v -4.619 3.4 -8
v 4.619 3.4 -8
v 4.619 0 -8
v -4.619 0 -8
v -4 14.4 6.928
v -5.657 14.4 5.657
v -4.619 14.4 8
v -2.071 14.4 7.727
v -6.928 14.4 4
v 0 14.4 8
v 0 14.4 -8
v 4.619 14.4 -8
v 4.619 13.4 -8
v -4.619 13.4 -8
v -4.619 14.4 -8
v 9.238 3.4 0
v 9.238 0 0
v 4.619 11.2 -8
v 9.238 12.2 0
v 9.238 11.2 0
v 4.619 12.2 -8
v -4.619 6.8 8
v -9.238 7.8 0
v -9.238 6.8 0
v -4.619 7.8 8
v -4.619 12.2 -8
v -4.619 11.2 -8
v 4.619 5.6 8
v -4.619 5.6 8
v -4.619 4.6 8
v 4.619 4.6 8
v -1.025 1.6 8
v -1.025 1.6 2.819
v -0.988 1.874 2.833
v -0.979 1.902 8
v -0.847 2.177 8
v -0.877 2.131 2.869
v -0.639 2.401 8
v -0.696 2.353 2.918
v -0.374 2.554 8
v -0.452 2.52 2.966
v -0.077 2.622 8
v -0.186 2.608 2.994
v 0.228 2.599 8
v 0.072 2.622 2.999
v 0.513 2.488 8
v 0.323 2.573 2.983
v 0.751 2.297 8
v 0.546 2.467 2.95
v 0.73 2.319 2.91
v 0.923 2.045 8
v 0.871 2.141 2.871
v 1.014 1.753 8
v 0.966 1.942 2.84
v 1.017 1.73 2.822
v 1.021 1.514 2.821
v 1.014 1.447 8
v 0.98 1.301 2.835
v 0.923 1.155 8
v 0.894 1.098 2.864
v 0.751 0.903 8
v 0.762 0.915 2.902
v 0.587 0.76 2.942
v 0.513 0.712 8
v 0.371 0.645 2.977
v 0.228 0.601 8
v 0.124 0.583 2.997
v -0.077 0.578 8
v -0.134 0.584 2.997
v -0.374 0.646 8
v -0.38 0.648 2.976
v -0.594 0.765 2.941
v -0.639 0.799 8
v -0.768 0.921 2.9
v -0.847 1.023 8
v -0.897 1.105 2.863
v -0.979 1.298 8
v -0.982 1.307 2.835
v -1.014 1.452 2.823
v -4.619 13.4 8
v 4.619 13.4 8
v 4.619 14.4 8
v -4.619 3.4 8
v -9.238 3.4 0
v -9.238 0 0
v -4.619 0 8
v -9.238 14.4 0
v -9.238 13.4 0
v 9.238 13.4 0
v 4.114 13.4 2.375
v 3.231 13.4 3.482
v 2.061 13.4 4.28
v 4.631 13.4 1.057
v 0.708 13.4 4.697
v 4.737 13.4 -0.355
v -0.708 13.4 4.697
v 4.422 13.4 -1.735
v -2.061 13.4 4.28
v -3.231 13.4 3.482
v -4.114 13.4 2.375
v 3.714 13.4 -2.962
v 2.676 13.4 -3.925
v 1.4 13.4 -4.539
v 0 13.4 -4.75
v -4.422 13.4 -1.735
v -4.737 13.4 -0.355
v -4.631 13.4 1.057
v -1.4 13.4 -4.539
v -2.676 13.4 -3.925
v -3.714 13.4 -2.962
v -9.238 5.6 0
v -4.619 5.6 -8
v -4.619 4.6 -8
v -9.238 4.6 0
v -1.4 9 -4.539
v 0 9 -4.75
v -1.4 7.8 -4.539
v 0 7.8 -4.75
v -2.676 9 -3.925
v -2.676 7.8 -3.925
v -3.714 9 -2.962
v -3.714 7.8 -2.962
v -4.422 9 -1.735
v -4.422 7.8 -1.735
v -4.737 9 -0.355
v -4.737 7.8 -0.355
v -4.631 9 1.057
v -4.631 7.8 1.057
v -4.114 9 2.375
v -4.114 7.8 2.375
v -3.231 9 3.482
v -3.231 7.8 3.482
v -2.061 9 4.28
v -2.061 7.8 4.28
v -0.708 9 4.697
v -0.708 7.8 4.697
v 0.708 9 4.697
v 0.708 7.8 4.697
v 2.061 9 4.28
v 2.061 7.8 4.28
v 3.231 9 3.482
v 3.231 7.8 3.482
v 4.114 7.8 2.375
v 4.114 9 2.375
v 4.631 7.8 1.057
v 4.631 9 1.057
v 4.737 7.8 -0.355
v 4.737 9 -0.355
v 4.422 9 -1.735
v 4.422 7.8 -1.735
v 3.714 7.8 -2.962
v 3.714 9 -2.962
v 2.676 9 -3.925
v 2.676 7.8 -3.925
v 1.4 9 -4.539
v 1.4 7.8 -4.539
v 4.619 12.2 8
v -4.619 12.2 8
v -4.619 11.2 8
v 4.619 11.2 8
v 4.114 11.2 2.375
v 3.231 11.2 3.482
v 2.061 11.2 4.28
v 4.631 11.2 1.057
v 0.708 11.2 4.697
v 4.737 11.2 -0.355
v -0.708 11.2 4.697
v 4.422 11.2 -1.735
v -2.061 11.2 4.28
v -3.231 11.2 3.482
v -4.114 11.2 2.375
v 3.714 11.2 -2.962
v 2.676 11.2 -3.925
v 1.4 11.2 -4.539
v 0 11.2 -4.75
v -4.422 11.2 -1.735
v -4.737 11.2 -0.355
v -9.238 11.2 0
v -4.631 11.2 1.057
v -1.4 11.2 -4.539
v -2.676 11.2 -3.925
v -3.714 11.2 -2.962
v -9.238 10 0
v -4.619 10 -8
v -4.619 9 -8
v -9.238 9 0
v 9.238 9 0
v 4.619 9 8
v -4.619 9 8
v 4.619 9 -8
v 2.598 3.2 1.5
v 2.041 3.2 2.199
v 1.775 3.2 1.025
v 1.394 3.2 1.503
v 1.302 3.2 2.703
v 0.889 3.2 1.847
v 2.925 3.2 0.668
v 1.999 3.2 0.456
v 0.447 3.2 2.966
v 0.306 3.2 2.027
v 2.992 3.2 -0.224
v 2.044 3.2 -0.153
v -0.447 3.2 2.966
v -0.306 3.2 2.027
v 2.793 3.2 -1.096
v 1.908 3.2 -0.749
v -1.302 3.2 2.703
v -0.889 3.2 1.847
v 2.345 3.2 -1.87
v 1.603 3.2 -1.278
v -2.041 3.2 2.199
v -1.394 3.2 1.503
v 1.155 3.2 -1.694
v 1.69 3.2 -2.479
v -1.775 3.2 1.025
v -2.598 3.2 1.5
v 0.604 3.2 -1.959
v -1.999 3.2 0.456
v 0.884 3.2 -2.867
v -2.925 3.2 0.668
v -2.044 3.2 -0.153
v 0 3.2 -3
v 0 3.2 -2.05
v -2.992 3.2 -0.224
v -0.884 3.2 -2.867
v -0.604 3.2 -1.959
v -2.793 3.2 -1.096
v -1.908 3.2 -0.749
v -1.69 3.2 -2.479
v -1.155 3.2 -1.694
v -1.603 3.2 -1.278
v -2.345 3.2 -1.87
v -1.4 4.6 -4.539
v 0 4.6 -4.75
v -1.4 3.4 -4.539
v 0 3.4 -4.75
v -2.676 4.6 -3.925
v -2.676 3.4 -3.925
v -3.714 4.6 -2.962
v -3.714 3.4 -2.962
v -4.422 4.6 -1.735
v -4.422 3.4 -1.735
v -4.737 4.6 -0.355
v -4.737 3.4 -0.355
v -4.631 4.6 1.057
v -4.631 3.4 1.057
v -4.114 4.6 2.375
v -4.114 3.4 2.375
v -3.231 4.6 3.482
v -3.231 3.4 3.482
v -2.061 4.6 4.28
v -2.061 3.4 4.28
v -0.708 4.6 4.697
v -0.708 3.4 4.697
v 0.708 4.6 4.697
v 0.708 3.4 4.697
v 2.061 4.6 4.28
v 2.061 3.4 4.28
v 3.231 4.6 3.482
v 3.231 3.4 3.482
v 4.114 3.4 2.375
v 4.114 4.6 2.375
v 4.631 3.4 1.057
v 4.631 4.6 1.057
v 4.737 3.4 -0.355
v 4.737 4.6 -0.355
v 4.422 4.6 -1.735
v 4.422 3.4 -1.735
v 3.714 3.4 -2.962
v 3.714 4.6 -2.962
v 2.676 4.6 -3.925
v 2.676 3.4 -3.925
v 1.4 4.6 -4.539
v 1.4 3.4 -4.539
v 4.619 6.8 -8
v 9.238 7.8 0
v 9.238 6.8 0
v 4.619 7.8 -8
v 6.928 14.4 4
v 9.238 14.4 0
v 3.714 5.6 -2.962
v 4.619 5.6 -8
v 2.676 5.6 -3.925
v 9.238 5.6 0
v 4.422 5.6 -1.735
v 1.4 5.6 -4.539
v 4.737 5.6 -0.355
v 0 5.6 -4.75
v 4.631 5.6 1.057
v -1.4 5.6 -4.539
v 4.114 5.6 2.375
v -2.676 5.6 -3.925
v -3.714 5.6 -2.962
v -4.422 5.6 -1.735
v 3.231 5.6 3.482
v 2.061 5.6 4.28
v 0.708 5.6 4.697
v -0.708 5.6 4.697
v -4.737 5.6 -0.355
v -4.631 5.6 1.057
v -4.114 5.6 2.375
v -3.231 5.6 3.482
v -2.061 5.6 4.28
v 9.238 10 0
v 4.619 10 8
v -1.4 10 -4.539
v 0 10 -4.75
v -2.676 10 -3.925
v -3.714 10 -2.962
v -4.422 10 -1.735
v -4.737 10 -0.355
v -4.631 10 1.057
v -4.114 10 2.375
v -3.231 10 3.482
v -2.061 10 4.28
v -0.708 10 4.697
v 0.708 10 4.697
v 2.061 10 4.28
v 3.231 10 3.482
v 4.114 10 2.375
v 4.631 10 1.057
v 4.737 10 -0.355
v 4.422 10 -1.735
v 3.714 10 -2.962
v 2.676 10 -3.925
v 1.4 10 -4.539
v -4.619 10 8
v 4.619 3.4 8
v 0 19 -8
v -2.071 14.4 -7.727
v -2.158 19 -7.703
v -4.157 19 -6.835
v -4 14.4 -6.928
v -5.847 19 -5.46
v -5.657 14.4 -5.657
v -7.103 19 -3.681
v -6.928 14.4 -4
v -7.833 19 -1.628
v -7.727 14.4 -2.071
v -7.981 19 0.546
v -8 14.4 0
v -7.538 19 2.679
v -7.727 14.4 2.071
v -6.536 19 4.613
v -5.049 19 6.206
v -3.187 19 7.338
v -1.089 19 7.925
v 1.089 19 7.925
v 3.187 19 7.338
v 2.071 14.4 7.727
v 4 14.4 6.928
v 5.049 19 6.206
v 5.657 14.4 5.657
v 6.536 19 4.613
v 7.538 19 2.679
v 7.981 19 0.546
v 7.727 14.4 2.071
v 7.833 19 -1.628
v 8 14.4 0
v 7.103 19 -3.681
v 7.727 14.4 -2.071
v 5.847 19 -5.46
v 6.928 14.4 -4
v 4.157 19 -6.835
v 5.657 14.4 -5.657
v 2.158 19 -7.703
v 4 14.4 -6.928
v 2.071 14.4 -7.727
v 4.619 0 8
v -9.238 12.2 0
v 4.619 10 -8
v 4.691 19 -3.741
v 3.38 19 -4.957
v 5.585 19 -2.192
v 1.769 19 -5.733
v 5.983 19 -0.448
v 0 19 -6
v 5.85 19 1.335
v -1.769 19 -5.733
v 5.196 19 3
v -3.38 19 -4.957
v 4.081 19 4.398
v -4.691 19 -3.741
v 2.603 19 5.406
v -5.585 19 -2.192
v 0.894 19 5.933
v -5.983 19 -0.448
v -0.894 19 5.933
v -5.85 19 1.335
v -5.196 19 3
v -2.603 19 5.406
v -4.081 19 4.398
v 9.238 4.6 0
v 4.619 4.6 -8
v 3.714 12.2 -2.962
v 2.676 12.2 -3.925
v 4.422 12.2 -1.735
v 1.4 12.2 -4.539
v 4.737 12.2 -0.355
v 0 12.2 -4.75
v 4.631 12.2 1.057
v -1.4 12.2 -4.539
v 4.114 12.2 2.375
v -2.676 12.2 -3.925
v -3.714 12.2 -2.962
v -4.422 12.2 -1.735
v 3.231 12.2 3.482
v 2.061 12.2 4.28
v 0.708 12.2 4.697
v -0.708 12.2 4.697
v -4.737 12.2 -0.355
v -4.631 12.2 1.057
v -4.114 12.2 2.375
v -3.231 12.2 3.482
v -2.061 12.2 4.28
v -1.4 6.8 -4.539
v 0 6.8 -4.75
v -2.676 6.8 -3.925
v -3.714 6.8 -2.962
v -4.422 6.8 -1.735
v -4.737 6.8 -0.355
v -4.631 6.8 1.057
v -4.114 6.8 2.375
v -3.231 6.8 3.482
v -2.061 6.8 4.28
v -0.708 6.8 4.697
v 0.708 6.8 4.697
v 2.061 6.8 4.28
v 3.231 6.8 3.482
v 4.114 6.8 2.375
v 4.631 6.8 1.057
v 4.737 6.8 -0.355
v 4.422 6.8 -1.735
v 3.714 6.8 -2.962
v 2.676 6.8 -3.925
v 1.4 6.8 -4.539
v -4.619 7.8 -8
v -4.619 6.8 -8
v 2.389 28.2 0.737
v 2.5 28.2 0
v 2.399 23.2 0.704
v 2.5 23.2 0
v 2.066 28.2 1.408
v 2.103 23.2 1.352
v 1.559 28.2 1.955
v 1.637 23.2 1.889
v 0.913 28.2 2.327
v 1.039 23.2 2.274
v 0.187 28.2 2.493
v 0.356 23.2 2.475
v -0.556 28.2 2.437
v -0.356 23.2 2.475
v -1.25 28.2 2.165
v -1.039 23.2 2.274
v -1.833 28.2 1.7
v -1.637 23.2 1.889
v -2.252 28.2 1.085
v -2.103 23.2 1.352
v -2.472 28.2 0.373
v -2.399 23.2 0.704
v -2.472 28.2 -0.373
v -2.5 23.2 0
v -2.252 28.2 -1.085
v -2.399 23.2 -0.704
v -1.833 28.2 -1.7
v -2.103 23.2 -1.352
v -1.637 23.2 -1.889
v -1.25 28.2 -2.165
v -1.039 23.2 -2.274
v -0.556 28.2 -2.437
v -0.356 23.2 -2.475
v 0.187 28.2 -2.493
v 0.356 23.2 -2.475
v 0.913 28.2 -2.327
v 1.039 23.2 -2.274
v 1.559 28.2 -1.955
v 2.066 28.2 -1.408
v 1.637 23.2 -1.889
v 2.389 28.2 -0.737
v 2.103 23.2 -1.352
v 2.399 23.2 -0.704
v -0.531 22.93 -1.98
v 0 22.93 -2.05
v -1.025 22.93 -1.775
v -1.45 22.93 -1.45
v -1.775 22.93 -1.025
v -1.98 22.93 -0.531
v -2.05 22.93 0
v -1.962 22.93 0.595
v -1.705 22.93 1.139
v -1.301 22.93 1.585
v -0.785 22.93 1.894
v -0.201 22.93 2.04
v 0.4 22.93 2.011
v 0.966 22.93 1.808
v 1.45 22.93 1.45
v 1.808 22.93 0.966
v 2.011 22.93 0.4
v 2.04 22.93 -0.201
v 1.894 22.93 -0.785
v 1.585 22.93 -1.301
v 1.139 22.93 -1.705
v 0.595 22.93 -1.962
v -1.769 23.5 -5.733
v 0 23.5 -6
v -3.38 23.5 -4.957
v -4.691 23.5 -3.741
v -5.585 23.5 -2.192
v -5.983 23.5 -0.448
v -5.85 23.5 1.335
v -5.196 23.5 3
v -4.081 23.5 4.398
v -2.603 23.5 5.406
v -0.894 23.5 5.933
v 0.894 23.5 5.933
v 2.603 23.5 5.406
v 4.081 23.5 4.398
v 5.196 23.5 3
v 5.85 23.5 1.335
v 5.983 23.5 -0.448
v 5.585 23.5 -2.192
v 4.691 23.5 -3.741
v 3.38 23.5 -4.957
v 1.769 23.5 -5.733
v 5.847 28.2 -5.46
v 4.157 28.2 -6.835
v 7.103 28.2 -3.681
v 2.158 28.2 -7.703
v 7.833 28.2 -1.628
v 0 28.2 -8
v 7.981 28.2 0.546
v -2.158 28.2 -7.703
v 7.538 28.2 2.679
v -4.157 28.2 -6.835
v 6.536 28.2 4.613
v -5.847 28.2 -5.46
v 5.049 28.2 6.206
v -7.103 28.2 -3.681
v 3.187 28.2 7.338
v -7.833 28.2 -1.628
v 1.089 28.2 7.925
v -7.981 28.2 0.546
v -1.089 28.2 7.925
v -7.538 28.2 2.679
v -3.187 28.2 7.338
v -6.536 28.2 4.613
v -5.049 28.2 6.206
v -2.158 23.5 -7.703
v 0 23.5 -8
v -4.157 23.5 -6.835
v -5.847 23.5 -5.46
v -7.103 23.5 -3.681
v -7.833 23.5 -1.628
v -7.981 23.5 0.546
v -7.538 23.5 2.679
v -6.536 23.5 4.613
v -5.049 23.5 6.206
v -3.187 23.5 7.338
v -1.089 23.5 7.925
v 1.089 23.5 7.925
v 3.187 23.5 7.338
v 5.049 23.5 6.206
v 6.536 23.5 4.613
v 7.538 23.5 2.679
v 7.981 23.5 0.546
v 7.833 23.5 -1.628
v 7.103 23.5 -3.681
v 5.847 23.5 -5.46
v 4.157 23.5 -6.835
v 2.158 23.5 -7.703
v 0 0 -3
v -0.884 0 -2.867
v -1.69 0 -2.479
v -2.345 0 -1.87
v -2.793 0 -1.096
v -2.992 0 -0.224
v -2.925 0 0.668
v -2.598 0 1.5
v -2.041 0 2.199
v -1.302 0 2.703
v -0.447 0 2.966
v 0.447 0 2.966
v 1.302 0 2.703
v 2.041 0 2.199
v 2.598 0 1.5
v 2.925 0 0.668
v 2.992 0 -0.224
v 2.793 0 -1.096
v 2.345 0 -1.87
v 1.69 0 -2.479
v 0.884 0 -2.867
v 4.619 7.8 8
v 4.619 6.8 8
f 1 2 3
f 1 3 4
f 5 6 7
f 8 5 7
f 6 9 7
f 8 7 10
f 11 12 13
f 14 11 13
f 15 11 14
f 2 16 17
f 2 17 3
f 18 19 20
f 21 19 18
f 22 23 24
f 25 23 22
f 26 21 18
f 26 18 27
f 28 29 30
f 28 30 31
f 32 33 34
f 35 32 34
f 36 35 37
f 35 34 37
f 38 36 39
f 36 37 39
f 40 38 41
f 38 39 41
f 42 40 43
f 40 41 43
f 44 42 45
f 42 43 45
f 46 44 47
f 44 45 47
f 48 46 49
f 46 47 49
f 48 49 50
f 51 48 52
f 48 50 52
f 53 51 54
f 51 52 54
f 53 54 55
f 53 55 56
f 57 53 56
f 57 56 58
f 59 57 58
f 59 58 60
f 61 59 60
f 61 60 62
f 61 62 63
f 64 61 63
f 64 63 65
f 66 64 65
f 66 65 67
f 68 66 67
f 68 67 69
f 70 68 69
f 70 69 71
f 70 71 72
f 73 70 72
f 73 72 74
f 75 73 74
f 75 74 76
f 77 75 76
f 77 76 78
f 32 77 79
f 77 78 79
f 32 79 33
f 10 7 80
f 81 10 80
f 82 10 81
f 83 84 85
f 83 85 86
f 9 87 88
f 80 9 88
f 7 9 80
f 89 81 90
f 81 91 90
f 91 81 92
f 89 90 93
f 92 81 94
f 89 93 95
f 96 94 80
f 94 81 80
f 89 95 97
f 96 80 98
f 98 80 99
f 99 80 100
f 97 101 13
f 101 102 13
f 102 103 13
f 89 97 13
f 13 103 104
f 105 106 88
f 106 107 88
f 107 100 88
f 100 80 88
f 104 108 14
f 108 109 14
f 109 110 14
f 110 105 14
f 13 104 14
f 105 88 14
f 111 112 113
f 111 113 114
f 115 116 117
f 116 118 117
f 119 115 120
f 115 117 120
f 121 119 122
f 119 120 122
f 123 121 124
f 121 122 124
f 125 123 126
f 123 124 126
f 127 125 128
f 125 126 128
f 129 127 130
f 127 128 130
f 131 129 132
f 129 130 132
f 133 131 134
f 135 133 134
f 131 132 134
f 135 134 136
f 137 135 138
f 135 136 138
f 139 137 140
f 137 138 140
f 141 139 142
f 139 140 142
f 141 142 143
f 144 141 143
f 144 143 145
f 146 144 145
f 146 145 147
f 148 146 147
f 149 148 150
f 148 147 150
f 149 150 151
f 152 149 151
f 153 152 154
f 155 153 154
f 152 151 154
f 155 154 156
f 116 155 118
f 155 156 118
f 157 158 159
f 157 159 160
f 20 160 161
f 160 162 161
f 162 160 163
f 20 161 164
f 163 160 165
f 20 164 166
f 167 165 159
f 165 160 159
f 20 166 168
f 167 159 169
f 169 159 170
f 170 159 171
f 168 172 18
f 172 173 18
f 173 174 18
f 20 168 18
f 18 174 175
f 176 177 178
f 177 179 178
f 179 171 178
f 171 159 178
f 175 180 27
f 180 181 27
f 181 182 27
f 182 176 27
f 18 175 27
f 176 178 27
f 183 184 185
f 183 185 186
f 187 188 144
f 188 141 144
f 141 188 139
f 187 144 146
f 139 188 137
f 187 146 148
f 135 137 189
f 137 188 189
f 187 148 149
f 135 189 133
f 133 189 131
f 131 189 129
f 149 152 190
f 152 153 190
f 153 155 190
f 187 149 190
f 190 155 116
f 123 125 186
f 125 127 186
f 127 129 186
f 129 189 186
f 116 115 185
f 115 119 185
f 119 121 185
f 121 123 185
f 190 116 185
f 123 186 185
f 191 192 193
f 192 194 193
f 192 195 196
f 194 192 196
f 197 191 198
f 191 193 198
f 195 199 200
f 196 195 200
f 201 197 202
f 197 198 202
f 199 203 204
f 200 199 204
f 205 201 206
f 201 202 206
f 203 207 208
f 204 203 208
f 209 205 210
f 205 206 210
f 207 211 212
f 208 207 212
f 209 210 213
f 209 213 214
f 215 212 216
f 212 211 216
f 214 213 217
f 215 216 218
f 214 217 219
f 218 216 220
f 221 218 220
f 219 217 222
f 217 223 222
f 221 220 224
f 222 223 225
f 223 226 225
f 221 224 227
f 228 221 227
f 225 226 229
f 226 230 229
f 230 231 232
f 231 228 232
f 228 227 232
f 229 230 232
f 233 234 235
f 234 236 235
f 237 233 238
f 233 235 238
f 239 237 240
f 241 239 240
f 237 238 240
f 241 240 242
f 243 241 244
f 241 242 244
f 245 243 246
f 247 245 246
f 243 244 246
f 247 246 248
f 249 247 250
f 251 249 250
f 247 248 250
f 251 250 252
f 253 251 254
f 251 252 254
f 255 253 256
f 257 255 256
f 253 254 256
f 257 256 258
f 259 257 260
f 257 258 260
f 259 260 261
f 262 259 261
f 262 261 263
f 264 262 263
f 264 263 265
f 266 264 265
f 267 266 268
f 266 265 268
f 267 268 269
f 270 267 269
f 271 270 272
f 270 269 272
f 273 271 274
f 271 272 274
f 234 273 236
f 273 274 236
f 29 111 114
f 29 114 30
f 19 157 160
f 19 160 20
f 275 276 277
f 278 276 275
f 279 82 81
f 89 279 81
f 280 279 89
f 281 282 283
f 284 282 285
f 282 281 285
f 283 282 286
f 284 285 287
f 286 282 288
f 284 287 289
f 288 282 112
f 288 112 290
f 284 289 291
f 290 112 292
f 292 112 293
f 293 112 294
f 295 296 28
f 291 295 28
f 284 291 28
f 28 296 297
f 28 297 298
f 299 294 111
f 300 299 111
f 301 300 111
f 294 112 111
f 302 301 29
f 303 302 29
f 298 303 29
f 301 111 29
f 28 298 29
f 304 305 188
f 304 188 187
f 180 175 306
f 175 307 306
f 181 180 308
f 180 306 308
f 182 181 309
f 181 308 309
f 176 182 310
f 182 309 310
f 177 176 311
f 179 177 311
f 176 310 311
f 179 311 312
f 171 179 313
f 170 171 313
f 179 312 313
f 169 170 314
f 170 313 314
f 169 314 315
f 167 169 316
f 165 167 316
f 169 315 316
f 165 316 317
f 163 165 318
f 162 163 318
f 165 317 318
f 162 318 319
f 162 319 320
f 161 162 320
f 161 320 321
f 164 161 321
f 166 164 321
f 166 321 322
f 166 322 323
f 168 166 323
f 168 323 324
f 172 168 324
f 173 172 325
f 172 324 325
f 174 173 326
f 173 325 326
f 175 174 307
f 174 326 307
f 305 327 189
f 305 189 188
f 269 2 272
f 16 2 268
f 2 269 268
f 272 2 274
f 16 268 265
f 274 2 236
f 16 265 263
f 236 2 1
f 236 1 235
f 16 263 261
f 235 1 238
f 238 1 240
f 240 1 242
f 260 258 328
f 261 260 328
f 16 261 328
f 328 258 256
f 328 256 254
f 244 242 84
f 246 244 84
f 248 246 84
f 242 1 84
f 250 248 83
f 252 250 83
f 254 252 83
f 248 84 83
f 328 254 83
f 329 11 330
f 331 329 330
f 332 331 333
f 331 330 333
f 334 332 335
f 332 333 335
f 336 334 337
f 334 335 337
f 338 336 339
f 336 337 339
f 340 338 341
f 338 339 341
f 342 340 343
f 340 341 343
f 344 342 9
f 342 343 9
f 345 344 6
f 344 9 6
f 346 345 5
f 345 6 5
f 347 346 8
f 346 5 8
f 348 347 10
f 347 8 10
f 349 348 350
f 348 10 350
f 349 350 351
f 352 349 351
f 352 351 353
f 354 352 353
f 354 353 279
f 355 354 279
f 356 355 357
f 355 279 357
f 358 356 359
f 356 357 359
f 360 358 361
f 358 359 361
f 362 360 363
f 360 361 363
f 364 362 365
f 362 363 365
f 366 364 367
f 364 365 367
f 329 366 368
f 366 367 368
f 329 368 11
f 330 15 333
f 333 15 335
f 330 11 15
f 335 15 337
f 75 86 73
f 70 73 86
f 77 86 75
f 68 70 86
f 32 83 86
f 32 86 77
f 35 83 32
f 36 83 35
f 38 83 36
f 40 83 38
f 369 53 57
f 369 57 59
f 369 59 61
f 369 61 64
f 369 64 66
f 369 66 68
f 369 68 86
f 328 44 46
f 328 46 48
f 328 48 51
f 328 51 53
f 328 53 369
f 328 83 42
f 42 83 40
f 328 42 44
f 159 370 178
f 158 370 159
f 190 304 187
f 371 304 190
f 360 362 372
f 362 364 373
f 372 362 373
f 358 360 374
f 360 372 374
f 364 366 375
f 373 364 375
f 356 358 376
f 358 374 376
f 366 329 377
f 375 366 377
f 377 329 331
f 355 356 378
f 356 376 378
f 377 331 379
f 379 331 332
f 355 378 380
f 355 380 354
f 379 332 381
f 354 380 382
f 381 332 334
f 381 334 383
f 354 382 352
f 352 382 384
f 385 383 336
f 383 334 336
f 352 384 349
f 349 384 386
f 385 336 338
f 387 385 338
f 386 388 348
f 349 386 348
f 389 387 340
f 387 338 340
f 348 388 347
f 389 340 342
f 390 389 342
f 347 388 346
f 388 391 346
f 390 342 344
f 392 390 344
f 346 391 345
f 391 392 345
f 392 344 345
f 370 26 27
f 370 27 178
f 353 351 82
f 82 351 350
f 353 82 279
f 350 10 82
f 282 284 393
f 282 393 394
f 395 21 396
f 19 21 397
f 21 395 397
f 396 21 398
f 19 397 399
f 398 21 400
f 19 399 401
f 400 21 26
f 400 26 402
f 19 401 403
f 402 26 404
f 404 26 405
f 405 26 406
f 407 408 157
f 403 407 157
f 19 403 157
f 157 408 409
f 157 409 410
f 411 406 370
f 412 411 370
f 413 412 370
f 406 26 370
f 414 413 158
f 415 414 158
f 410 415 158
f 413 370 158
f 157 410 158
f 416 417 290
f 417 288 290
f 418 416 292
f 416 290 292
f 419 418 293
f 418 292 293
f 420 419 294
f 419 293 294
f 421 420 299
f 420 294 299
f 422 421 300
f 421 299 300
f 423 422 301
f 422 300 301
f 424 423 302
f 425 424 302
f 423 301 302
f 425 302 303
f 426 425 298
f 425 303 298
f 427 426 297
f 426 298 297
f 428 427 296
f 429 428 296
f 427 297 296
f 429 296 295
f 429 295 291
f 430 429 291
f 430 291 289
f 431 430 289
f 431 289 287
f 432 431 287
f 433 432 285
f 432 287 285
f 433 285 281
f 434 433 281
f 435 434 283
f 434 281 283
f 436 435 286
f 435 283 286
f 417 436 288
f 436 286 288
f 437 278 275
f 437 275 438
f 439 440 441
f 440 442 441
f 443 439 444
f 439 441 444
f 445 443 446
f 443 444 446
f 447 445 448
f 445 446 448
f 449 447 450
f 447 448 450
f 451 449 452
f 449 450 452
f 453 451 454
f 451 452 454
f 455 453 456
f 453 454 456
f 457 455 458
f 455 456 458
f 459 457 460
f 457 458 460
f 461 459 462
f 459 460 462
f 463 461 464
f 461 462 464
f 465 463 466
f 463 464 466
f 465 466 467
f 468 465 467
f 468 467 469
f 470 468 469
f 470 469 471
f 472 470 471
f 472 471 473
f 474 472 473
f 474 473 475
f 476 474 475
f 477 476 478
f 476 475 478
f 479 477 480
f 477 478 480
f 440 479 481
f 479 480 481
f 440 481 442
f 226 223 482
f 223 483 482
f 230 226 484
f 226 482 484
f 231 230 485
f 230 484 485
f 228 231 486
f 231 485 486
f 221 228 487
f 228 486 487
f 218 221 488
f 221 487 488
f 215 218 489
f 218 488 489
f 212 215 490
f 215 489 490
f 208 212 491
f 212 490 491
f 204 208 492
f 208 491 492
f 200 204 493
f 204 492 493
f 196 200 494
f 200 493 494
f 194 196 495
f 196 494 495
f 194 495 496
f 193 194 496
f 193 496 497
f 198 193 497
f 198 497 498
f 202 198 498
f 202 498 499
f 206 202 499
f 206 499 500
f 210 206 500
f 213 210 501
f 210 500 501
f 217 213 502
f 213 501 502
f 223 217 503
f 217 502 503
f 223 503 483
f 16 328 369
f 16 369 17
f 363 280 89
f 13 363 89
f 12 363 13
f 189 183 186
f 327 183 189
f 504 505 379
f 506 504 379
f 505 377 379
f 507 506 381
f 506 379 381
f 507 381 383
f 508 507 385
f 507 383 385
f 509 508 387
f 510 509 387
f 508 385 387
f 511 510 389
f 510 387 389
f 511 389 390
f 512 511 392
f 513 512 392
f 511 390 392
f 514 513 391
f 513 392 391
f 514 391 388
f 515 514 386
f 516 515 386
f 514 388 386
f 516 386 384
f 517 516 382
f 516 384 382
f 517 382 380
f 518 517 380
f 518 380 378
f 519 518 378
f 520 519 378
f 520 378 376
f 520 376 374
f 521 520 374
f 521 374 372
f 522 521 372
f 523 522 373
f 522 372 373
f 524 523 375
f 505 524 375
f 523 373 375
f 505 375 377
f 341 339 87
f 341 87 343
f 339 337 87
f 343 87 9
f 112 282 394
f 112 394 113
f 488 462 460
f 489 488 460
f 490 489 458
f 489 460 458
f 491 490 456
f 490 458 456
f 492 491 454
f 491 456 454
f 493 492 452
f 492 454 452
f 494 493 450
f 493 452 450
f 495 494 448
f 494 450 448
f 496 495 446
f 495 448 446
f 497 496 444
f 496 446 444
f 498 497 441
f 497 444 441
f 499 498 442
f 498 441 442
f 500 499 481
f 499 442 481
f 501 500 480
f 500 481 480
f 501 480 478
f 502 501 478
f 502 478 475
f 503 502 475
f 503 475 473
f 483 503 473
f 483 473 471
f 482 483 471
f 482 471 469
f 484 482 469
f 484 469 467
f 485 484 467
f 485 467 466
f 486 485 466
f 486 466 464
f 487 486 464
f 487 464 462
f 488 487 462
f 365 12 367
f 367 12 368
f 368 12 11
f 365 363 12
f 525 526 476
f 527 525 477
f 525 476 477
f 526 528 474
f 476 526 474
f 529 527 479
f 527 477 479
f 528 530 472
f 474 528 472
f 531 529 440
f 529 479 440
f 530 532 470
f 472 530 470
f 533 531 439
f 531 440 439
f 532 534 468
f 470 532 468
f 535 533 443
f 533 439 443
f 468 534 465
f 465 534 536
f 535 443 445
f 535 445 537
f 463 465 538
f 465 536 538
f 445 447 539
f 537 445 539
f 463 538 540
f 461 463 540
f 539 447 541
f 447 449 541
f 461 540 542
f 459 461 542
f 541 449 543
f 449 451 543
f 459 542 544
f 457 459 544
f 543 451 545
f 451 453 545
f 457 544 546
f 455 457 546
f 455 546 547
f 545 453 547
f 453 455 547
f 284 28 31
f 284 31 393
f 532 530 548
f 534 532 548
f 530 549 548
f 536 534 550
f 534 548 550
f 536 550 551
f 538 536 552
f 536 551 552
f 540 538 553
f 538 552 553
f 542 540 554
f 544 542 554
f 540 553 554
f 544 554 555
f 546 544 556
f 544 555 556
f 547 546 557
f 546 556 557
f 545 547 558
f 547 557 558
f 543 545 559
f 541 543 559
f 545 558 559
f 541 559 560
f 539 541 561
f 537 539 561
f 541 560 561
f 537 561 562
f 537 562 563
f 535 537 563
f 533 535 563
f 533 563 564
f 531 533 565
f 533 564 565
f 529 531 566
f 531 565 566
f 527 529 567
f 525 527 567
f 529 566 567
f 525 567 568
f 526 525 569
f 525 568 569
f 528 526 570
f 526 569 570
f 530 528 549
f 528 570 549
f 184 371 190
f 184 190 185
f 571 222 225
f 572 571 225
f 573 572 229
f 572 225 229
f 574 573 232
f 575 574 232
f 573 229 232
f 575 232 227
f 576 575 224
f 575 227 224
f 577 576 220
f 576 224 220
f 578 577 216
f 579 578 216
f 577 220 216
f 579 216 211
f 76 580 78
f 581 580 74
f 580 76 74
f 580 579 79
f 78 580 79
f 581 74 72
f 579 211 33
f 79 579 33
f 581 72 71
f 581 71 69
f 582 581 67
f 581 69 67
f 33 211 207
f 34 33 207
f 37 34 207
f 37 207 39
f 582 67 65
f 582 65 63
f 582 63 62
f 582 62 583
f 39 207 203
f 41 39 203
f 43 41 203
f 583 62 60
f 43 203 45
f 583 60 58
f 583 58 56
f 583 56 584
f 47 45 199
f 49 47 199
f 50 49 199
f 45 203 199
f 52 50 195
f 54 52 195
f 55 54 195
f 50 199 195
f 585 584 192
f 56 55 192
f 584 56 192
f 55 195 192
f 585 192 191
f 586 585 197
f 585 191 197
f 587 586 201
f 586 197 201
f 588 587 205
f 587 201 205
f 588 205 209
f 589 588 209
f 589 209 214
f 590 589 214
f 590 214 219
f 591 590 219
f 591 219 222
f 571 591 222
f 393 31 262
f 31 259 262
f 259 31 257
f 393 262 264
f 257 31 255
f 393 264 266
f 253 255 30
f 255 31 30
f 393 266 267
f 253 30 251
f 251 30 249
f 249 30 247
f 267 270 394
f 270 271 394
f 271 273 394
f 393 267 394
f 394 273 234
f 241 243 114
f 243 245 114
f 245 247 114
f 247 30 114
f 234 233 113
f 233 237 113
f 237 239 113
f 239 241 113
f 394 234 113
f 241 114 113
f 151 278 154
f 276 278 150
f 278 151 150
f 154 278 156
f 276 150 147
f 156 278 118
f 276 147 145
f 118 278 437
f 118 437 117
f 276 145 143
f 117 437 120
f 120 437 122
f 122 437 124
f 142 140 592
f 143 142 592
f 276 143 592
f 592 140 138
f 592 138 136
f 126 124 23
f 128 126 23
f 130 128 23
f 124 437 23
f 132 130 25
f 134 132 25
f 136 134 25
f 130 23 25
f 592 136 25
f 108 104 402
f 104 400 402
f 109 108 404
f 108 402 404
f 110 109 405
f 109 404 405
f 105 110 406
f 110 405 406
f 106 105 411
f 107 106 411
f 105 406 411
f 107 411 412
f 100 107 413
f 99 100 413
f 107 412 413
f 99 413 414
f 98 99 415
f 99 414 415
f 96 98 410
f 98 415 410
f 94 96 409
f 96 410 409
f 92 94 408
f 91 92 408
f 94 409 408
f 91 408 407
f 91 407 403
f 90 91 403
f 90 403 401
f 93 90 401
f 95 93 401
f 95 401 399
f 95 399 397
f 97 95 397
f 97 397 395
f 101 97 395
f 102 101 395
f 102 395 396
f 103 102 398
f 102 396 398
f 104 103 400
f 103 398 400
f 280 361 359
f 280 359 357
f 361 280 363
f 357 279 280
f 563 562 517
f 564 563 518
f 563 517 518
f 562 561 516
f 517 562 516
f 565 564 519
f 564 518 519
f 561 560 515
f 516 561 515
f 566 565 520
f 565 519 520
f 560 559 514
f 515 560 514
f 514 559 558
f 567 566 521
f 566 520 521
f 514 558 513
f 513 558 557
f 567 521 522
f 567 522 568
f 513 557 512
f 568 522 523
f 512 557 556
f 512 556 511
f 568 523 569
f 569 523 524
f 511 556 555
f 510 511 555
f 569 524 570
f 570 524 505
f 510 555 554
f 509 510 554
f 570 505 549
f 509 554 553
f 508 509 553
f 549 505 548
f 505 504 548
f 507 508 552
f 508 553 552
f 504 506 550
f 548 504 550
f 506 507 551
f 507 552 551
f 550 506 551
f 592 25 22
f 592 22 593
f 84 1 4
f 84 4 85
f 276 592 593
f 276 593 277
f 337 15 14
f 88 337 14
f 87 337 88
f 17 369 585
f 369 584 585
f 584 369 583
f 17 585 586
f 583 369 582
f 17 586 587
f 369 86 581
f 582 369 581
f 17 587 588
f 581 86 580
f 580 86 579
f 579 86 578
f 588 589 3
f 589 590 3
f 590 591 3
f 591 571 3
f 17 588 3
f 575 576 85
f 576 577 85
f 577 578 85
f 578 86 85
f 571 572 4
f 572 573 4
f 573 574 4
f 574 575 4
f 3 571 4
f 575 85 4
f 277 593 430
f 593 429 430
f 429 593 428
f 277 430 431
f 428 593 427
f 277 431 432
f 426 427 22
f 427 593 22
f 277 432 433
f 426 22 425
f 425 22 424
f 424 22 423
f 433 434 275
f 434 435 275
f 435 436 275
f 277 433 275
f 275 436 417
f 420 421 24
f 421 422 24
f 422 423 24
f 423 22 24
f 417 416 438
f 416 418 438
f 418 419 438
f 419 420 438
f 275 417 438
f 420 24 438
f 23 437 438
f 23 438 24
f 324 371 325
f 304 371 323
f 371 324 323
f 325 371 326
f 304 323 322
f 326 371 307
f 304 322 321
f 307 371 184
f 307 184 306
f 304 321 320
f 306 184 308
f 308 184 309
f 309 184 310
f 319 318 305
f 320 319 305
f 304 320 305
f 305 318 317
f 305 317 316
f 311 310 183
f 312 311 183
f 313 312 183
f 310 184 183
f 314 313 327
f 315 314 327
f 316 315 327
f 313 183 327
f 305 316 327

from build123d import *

# Parameters (mm, degrees)
SKETCH2_OUTSIDE_W            = 40.48
SKETCH2_OUTSIDE_H            = 40.48
CUT_EXTRUDE1_DEPTH           = 15.4
M6X1_0_TAPPED_HOLE1_D        = 5
M6X1_0_TAPPED_HOLE1_DEPTH    = 5
M6X1_0_TAPPED_HOLE1_TIP      = 1.502151548
M2_5X0_45_TAPPED_HOLE1_D     = 2.05
M2_5X0_45_TAPPED_HOLE1_DEPTH = 9
M2_5X0_45_TAPPED_HOLE1_TIP   = 0.615882135


with BuildPart() as part:
    # Sketch1 → Revolve1 (revolve)
    with BuildSketch(Plane.XY, mode=Mode.PRIVATE) as revolve1_sk:
        Polygon((3, 0), (3, 3.2), (2.05, 3.2), (2.05, 28.2), (8, 28.2), (8, 23.5), (6, 23.5), (6, 19), (8, 19), (8, 14.4), (14.307769621, 14.4), (14.307769621, 13.4), (4.75, 13.4), (4.75, 12.2), (14.307769621, 12.2), (14.307769621, 11.2), (4.75, 11.2), (4.75, 10), (14.307769621, 10), (14.307769621, 9), (4.75, 9), (4.75, 7.8), (14.307769621, 7.8), (14.307769621, 6.8), (4.75, 6.8), (4.75, 5.6), (14.307769621, 5.6), (14.307769621, 4.6), (4.75, 4.6), (4.75, 3.4), (14.307769621, 3.4), (14.307769621, 0), align=None)
    revolve(revolve1_sk.sketch.rotate(Axis((0, 0, 0), (0, 1, 0)), 90), axis=Axis((0, 0, 0), (0, 1, 0)))  # turned: the seam where the file's is

    # Sketch2 outside → Cut-Extrude1 (cut, through all)
    with BuildSketch(Plane(origin=(0, 14.4, 0), x_dir=(1, 0, 0), z_dir=(0, 1, 0))):
        Rectangle(SKETCH2_OUTSIDE_W, SKETCH2_OUTSIDE_H)
        Polygon((-4.618802154, 8), (-9.237604307, 0), (-4.618802154, -8), (4.618802154, -8), (9.237604307, 0), (4.618802154, 8), align=None, mode=Mode.SUBTRACT)
    extrude(amount=-CUT_EXTRUDE1_DEPTH, mode=Mode.SUBTRACT)

    # M6x1.0 Tapped Hole1
    with Locations(Plane(origin=(0, 28.2, 0), x_dir=(-1, 0, 0), z_dir=(0, 1, 0))):
        with Locations((0, 0)):
            Hole(M6X1_0_TAPPED_HOLE1_D / 2, depth=M6X1_0_TAPPED_HOLE1_DEPTH)
            with Locations((0, 0, -(M6X1_0_TAPPED_HOLE1_DEPTH + M6X1_0_TAPPED_HOLE1_TIP / 2))):  # 118° drill point
                Cone(0, M6X1_0_TAPPED_HOLE1_D / 2, M6X1_0_TAPPED_HOLE1_TIP, mode=Mode.SUBTRACT)

    # M2.5x0.45 Tapped Hole1
    with Locations(Plane.XY.offset(8)):
        with Locations((0, 1.6)):
            Hole(M2_5X0_45_TAPPED_HOLE1_D / 2, depth=M2_5X0_45_TAPPED_HOLE1_DEPTH)
            with Locations((0, 0, -(M2_5X0_45_TAPPED_HOLE1_DEPTH + M2_5X0_45_TAPPED_HOLE1_TIP / 2))):  # 118° drill point
                Cone(0, M2_5X0_45_TAPPED_HOLE1_D / 2, M2_5X0_45_TAPPED_HOLE1_TIP, mode=Mode.SUBTRACT)


solid = part.part
